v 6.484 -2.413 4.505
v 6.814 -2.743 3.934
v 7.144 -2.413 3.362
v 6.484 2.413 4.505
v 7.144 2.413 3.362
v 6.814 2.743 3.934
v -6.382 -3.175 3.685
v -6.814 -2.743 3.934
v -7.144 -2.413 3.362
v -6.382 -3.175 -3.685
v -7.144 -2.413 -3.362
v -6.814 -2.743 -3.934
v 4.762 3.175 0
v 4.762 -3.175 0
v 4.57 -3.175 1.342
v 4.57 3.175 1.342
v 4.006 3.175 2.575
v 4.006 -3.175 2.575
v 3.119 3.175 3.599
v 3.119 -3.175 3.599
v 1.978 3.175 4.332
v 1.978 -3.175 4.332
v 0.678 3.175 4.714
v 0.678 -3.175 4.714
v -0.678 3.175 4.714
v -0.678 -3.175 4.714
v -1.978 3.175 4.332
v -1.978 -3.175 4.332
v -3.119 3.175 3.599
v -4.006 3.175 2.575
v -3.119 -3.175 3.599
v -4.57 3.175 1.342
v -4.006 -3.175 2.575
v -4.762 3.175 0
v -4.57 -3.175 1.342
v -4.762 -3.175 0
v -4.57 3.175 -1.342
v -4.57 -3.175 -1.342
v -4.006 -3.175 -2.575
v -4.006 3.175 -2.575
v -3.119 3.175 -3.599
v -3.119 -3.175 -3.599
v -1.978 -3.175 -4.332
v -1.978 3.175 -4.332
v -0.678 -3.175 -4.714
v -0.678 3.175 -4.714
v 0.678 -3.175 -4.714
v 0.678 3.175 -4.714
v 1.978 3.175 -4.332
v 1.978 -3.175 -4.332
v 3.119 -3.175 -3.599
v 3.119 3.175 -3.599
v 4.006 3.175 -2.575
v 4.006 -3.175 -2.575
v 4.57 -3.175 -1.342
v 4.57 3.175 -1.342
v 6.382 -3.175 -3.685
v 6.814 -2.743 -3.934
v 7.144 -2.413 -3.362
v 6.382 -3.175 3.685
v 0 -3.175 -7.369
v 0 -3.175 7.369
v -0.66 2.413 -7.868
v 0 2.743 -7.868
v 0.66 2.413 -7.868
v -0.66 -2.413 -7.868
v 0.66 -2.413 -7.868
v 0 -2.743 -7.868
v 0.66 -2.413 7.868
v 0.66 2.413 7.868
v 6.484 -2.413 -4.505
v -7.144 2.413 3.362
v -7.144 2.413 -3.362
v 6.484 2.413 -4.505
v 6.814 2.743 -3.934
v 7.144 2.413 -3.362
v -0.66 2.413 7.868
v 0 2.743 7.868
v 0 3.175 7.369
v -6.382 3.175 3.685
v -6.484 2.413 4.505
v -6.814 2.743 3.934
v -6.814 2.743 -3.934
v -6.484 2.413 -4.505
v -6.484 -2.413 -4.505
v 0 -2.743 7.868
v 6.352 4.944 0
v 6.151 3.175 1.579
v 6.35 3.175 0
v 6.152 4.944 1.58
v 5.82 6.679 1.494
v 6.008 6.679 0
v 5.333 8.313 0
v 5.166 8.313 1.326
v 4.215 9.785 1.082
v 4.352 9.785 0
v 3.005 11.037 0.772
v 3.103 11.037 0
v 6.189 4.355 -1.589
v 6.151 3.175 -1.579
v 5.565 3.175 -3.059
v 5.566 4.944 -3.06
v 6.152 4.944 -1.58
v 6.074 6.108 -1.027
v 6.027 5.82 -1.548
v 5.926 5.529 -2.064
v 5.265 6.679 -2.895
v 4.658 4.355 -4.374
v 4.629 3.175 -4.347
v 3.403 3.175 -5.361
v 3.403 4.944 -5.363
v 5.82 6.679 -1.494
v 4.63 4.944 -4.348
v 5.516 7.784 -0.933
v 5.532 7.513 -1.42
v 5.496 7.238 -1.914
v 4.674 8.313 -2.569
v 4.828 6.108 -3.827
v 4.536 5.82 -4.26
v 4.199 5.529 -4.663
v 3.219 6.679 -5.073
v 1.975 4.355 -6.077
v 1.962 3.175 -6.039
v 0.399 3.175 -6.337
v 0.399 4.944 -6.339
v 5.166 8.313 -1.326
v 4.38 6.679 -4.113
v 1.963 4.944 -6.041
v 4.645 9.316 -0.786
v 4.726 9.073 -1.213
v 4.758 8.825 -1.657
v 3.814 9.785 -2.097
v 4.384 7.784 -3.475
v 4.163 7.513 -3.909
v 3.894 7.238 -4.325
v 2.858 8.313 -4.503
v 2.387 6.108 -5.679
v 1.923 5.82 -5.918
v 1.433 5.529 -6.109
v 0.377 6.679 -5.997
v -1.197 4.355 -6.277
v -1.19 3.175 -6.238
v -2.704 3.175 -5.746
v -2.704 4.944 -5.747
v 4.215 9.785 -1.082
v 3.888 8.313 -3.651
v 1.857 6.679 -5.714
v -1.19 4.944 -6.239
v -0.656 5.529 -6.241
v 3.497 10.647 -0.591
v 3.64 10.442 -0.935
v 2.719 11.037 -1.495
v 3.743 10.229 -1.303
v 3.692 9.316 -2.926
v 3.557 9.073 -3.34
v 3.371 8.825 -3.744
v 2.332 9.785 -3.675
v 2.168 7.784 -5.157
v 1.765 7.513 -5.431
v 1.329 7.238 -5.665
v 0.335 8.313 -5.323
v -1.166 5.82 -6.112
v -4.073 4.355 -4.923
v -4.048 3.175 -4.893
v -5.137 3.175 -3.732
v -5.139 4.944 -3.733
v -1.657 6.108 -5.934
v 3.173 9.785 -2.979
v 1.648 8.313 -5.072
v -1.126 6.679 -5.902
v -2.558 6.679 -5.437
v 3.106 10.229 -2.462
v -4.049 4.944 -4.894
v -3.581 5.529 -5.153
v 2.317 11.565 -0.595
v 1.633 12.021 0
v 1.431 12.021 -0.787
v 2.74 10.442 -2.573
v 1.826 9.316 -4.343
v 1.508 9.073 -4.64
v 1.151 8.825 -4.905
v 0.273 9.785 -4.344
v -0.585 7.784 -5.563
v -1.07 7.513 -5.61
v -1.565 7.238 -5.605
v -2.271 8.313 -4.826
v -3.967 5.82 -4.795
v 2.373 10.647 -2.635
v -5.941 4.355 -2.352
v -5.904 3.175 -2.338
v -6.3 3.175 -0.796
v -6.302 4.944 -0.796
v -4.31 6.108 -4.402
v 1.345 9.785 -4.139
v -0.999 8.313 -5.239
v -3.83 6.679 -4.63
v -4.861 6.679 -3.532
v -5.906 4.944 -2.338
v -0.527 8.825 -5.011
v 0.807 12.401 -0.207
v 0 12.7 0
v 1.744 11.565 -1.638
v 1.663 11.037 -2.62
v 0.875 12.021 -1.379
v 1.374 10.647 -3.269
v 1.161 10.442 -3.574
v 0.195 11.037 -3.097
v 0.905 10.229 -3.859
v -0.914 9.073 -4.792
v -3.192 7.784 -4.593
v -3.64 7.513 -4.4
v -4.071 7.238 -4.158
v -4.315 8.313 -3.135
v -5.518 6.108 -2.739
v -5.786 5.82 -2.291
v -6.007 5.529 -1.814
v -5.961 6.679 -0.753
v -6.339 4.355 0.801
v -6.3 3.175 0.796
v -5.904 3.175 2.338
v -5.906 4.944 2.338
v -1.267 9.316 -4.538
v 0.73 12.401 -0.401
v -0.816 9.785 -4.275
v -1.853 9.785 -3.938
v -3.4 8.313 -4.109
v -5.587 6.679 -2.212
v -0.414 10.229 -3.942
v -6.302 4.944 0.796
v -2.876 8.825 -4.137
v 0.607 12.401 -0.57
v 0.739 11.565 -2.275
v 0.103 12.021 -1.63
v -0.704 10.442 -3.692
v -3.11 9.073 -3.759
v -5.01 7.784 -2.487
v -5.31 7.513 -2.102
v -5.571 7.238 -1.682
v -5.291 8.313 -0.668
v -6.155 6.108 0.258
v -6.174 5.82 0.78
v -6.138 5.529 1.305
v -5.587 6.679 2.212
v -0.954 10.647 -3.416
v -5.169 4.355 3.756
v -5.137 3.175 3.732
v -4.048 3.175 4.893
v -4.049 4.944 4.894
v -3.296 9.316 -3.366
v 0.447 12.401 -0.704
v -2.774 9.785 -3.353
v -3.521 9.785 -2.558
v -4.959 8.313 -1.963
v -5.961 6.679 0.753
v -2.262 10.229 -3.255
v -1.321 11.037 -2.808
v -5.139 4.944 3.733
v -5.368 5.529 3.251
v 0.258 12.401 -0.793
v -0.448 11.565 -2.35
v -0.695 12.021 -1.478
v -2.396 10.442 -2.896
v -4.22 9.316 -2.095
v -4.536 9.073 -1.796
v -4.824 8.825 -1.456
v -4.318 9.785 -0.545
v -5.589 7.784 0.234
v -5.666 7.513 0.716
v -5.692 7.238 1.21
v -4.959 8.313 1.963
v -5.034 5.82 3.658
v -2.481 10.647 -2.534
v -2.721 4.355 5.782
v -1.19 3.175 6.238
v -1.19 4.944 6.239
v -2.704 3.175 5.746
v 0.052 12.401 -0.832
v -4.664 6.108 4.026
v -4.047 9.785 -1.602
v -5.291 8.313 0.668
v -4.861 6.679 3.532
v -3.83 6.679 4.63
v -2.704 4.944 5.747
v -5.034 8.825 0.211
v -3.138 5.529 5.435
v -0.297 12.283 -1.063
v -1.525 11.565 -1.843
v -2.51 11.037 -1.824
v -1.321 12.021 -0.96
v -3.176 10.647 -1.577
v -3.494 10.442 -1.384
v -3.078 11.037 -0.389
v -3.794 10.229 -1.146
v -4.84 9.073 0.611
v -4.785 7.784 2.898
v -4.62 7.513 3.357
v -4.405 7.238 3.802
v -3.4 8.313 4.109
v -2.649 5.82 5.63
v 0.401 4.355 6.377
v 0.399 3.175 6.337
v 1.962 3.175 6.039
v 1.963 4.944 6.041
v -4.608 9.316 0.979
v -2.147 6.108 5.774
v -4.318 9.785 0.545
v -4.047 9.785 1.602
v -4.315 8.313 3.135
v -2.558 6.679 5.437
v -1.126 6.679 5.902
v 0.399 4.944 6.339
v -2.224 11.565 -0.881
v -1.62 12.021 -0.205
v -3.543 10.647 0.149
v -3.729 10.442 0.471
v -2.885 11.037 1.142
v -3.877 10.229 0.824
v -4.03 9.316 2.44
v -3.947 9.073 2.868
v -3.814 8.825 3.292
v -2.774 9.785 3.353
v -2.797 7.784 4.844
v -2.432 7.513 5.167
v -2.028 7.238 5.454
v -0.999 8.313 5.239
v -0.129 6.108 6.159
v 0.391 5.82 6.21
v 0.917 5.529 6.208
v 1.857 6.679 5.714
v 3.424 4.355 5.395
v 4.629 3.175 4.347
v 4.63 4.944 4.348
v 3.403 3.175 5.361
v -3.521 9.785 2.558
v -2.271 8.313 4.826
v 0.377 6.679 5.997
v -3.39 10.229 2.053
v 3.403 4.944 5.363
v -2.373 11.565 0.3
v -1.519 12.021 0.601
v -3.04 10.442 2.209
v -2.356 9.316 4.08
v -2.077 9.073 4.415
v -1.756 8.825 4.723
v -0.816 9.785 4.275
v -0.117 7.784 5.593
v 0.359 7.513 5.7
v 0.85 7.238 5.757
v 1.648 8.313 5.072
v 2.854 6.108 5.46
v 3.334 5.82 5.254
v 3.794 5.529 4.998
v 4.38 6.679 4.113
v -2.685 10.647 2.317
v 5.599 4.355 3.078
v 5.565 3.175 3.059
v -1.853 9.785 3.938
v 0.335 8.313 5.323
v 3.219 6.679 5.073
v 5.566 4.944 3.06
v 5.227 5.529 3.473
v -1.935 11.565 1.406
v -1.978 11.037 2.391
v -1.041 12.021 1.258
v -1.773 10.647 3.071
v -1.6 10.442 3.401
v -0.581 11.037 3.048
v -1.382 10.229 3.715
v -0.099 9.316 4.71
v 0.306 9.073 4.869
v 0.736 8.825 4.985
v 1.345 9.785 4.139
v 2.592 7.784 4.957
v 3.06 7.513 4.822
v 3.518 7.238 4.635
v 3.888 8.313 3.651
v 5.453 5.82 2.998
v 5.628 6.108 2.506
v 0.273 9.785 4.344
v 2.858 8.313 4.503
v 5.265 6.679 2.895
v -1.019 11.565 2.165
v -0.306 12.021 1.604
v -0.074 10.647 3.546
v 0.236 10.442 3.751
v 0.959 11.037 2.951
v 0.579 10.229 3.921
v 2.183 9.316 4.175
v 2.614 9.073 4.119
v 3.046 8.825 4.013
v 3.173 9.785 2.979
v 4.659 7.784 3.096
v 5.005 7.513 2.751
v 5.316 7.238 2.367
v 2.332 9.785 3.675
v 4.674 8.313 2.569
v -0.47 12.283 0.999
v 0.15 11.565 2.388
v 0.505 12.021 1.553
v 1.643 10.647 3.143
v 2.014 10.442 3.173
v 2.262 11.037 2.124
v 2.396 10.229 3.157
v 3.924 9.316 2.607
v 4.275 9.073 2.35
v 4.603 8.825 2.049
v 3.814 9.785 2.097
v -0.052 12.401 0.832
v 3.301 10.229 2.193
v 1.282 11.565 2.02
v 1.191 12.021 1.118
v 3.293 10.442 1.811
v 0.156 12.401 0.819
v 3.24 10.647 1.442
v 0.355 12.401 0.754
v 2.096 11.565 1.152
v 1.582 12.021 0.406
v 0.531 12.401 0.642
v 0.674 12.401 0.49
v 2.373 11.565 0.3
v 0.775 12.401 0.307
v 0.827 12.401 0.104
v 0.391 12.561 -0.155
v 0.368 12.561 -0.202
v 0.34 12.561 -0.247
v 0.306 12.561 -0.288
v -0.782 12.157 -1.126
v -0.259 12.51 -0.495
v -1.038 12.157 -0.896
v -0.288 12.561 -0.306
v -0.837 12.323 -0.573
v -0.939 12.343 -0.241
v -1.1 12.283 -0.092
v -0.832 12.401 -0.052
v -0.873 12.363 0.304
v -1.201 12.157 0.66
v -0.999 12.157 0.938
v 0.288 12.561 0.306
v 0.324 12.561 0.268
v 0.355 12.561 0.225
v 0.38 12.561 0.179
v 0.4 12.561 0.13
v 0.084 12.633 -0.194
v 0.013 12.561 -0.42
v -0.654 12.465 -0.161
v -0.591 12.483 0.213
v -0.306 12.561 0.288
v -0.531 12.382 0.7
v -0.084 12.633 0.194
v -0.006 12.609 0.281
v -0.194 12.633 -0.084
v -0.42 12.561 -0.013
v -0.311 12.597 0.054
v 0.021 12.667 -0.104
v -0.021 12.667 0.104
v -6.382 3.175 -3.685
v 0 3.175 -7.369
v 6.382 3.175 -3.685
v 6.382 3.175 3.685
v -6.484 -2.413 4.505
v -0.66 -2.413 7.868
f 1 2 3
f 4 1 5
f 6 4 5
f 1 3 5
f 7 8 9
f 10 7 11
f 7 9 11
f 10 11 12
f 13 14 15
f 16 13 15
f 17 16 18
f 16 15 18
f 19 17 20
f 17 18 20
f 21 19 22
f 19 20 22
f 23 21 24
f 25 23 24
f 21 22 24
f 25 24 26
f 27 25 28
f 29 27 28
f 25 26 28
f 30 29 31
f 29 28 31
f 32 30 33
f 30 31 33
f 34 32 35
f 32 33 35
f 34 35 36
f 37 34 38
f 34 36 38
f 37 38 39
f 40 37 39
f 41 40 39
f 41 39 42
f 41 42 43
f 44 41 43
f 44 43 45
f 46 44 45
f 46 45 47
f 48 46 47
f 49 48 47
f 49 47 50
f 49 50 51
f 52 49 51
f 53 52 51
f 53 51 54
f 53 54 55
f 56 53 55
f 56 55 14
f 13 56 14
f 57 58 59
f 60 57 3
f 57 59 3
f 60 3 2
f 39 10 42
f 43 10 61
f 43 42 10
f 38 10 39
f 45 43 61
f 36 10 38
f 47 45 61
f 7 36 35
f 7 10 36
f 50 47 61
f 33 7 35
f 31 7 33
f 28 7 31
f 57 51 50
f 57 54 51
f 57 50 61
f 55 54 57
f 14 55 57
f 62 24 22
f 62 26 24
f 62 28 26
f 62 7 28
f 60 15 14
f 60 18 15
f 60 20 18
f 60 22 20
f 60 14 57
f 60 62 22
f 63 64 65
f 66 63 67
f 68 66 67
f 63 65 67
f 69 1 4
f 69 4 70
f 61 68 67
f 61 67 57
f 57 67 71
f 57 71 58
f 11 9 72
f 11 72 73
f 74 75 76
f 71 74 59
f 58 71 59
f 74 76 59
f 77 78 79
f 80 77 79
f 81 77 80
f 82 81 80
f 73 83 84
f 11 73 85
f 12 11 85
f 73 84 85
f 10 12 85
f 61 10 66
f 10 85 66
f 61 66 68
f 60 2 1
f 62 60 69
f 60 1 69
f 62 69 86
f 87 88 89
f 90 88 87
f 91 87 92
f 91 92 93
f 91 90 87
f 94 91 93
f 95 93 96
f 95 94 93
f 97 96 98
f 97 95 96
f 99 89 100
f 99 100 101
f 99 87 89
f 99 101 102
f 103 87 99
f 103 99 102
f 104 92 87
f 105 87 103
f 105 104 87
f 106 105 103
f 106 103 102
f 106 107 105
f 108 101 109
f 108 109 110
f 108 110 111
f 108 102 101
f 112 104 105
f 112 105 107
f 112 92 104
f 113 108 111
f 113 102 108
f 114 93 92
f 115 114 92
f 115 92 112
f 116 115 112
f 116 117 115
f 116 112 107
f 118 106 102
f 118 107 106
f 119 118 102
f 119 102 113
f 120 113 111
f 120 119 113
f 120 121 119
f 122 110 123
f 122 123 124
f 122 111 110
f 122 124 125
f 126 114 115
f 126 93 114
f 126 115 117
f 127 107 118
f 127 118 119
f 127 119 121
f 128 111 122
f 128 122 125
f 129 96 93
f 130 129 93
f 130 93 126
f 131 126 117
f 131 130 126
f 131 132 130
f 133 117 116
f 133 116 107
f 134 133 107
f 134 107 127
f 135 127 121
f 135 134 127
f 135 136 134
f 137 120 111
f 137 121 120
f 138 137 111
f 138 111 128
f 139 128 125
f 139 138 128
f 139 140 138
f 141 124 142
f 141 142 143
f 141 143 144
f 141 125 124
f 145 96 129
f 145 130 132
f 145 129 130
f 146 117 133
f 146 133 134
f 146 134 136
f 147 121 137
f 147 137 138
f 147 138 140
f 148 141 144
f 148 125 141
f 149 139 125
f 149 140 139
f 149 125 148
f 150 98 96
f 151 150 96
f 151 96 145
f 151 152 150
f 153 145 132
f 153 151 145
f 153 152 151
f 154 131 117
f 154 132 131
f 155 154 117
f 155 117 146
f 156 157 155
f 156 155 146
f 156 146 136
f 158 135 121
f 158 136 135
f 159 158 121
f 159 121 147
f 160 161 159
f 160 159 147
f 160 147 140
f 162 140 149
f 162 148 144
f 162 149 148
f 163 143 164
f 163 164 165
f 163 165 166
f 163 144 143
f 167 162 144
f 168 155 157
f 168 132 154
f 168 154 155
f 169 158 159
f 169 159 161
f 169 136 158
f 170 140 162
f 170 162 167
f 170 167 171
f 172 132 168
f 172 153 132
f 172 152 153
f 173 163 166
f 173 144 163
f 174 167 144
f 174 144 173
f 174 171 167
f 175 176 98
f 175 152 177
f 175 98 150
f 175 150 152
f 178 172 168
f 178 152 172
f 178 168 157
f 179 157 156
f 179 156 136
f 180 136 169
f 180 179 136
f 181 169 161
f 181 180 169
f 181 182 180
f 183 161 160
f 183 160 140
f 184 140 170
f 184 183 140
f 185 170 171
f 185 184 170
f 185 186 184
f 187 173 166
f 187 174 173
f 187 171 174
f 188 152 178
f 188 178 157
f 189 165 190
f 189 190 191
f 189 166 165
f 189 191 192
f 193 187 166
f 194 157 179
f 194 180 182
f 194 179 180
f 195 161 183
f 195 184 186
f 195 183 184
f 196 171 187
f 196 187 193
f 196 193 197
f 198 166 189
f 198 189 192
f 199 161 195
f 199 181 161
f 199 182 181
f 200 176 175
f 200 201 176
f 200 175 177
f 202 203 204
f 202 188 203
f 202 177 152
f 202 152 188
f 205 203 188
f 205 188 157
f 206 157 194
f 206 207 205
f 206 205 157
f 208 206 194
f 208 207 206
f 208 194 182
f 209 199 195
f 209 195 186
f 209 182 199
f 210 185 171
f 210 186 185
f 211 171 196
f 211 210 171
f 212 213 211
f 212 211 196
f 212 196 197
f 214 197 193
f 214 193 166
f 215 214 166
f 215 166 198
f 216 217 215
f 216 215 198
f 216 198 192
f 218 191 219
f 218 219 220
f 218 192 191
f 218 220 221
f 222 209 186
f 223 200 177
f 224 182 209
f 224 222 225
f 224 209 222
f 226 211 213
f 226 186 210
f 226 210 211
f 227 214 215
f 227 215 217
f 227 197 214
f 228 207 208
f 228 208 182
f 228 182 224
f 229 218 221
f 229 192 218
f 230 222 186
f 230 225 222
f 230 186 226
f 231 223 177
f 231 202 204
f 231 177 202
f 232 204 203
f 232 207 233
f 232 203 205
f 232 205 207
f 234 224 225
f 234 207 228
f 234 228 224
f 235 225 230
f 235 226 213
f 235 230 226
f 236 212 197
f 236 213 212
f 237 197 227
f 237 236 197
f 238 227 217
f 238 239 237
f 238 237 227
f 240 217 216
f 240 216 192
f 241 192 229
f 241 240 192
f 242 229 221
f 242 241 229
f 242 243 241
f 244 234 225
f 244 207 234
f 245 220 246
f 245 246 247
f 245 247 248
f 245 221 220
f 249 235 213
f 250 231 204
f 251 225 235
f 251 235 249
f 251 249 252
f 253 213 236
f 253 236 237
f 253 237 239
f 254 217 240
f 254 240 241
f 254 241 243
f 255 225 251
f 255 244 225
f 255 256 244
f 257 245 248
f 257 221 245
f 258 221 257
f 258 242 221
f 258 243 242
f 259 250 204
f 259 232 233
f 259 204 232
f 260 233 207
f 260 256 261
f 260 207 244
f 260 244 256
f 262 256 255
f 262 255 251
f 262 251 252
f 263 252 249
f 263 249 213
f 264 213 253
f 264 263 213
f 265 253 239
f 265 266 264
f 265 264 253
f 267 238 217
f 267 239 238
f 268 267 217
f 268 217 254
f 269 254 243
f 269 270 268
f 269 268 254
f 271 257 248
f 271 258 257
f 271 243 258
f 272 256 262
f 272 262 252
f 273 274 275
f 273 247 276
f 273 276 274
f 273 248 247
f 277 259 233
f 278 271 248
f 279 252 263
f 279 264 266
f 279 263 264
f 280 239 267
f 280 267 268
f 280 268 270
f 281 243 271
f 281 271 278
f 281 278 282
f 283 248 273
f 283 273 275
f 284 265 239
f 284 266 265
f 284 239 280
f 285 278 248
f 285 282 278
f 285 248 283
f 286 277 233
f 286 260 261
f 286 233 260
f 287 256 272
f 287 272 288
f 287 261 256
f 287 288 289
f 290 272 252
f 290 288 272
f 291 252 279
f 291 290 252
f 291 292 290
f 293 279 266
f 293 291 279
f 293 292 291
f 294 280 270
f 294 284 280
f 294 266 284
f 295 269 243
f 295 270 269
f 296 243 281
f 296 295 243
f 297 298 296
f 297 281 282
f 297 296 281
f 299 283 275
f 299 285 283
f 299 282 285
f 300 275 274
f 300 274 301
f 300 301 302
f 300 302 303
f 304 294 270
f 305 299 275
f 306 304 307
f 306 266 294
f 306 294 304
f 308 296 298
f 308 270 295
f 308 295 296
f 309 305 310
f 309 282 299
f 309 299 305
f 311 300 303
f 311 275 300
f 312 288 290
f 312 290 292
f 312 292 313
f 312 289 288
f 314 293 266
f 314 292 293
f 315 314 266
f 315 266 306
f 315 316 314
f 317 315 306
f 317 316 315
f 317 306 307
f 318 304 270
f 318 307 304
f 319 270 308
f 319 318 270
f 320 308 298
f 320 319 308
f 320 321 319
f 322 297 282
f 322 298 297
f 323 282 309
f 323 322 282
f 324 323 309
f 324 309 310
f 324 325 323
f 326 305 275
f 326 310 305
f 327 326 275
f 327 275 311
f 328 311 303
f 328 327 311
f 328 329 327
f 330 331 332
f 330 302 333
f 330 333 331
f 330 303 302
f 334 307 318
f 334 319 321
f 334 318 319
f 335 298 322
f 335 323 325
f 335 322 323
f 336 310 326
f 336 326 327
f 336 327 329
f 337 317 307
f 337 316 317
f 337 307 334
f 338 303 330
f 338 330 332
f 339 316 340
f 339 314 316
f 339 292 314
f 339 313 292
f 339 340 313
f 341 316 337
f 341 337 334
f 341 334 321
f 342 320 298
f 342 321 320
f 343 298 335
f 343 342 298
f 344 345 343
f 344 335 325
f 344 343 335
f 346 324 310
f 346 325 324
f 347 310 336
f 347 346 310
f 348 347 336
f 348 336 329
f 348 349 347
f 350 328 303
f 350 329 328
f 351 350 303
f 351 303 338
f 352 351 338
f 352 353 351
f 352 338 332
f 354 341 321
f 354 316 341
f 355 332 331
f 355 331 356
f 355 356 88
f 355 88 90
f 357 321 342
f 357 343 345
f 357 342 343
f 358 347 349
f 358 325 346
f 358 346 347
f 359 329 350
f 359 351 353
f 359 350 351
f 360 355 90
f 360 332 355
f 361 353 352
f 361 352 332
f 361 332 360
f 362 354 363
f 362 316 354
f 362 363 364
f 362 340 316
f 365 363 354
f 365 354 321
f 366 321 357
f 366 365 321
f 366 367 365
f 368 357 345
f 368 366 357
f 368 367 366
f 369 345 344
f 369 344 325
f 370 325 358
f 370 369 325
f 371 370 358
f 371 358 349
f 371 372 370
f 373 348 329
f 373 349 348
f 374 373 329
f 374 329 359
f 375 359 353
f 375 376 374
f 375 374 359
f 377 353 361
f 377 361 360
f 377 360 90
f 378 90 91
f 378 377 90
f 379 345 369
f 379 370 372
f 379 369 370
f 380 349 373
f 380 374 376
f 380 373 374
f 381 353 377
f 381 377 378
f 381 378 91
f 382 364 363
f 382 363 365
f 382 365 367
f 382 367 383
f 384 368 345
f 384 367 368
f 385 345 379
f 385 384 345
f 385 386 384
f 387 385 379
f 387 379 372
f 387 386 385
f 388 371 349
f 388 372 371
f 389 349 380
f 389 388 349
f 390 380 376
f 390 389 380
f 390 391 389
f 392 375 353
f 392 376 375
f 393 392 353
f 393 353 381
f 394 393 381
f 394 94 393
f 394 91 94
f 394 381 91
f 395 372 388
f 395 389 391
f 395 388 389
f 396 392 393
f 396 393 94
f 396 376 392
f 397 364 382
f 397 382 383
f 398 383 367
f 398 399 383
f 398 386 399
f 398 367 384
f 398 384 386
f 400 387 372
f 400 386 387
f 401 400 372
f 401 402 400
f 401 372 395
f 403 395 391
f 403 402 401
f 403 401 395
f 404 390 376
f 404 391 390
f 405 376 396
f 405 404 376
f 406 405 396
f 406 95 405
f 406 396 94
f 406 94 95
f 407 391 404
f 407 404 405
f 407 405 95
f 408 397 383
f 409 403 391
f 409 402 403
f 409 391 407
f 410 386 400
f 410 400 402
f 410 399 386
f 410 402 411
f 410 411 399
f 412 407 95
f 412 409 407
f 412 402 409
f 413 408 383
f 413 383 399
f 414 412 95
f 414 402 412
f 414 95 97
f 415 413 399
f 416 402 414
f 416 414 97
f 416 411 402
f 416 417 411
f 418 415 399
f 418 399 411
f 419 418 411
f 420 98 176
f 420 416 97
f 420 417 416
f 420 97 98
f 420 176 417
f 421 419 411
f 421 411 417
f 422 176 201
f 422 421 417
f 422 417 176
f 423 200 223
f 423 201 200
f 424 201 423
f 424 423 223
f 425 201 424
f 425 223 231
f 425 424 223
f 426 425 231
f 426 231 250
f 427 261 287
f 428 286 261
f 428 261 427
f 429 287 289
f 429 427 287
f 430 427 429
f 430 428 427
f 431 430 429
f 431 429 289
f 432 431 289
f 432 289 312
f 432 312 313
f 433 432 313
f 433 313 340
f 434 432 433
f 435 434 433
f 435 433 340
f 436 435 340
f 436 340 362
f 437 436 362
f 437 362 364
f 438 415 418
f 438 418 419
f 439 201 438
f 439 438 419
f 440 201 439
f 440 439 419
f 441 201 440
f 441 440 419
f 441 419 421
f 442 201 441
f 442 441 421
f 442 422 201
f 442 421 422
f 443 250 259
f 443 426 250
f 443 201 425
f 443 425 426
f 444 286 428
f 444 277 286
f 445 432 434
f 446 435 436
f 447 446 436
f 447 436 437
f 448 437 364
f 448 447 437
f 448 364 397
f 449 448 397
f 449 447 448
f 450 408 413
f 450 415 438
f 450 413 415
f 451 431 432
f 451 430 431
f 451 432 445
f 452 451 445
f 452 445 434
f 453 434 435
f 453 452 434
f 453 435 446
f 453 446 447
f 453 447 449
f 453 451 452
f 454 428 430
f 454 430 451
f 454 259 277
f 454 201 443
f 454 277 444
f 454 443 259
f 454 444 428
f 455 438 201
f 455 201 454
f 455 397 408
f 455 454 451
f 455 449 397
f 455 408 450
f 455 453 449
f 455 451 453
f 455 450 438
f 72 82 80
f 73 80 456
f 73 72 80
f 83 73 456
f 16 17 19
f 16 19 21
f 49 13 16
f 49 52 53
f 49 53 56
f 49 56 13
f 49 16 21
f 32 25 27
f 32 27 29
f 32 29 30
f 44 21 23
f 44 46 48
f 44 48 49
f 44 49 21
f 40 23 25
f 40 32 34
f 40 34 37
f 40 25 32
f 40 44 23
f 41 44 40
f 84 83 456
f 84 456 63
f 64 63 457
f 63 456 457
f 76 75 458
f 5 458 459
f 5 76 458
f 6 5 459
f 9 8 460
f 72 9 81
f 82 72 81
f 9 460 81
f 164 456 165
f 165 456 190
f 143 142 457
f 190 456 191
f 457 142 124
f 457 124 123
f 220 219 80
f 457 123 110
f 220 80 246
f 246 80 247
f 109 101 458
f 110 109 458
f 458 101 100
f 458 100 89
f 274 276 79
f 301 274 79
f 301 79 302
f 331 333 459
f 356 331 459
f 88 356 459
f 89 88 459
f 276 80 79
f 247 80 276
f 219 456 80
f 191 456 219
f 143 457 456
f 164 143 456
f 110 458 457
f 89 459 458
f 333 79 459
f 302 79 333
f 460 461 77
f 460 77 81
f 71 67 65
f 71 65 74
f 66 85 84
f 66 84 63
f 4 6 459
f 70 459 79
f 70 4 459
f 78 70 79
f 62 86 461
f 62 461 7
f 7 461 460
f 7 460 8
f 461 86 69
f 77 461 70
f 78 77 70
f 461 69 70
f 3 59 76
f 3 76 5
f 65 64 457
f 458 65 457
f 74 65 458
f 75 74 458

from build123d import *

# Parameters (mm, degrees)
F1_DEPTH = 3.175
F2_R     = 4.7625
F3_DEPTH = 25
F4_SIZE  = 0.762
F5_SIZE  = 0.762
F6_SIZE  = 0.762


with BuildPart() as f1:
    # F0 (on Front) → F1 (new body, symmetric)
    with BuildSketch(Plane.XZ):
        Polygon((-7.14375, 4.1244459855), (-7.14375, -4.1244459855), (0, -8.248891971), (7.14375, -4.1244459855), (7.14375, 4.1244459855), (0, 8.248891971), align=None)
    extrude(amount=F1_DEPTH, both=True)

    # F2 (on face) → F3 (cut)
    with BuildSketch(Plane.XZ.offset(3.175)):
        Circle(F2_R)
    extrude(amount=-F3_DEPTH, mode=Mode.SUBTRACT)

    # F4
    f4_edges = [f1.edges().sort_by_distance(p)[0] for p in [
        (0, 0, 8.248892),
        (7.14375, 0, 4.124446),
        (7.14375, 0, -4.124446),
        (0, 0, -8.248892),
        (-7.14375, 0, -4.124446),
        (-7.14375, 0, 4.124446),
    ]]
    chamfer(f4_edges, length=F4_SIZE)

    # F5 (call 1 of 6: OpenCascade refuses the feature's edges together)
    f5_edges = [f1.edges().sort_by_distance(p)[0] for p in [
        (-3.571875, -3.175, -6.186669),
    ]]
    chamfer(f5_edges, length=F5_SIZE)

    # F5#2 (call 2 of 6)
    f5_2_edges = [f1.edges().sort_by_distance(p)[0] for p in [
        (3.571875, -3.175, -6.186669),
    ]]
    chamfer(f5_2_edges, length=F5_SIZE)

    # F5#3 (call 3 of 6)
    f5_3_edges = [f1.edges().sort_by_distance(p)[0] for p in [
        (7.14375, -3.175, 0),
    ]]
    chamfer(f5_3_edges, length=F5_SIZE)

    # F5#4 (call 4 of 6)
    f5_4_edges = [f1.edges().sort_by_distance(p)[0] for p in [
        (3.571875, -3.175, 6.186669),
    ]]
    chamfer(f5_4_edges, length=F5_SIZE)

    # F5#5 (call 5 of 6)
    f5_5_edges = [f1.edges().sort_by_distance(p)[0] for p in [
        (-3.571875, -3.175, 6.186669),
    ]]
    chamfer(f5_5_edges, length=F5_SIZE)

    # F5#6 (call 6 of 6)
    f5_6_edges = [f1.edges().sort_by_distance(p)[0] for p in [
        (-7.14375, -3.175, 0),
    ]]
    chamfer(f5_6_edges, length=F5_SIZE)

    # F6 (call 1 of 6: OpenCascade refuses the feature's edges together)
    f6_edges = [f1.edges().sort_by_distance(p)[0] for p in [
        (-3.571875, 3.175, -6.186669),
    ]]
    chamfer(f6_edges, length=F6_SIZE)

    # F6#2 (call 2 of 6)
    f6_2_edges = [f1.edges().sort_by_distance(p)[0] for p in [
        (3.571875, 3.175, -6.186669),
    ]]
    chamfer(f6_2_edges, length=F6_SIZE)

    # F6#3 (call 3 of 6)
    f6_3_edges = [f1.edges().sort_by_distance(p)[0] for p in [
        (7.14375, 3.175, 0),
    ]]
    chamfer(f6_3_edges, length=F6_SIZE)

    # F6#4 (call 4 of 6)
    f6_4_edges = [f1.edges().sort_by_distance(p)[0] for p in [
        (3.571875, 3.175, 6.186669),
    ]]
    chamfer(f6_4_edges, length=F6_SIZE)

    # F6#5 (call 5 of 6)
    f6_5_edges = [f1.edges().sort_by_distance(p)[0] for p in [
        (-3.571875, 3.175, 6.186669),
    ]]
    chamfer(f6_5_edges, length=F6_SIZE)

    # F6#6 (call 6 of 6)
    f6_6_edges = [f1.edges().sort_by_distance(p)[0] for p in [
        (-7.14375, 3.175, 0),
    ]]
    chamfer(f6_6_edges, length=F6_SIZE)

    # F7 (on Top) → F8 (revolve)
    with BuildSketch(Plane.XY):
        with BuildLine():
            Line((0, 12.7), (0, 3.175))
            Line((0, 3.175), (6.35, 3.175))
            ThreePointArc((6.35, 3.175), (4.8788606959, 9.0734071306), (0, 12.7))
        make_face()
    revolve(axis=Axis((0, 7.9375, 0), (0, 1, 0)))


solid = f1.part
